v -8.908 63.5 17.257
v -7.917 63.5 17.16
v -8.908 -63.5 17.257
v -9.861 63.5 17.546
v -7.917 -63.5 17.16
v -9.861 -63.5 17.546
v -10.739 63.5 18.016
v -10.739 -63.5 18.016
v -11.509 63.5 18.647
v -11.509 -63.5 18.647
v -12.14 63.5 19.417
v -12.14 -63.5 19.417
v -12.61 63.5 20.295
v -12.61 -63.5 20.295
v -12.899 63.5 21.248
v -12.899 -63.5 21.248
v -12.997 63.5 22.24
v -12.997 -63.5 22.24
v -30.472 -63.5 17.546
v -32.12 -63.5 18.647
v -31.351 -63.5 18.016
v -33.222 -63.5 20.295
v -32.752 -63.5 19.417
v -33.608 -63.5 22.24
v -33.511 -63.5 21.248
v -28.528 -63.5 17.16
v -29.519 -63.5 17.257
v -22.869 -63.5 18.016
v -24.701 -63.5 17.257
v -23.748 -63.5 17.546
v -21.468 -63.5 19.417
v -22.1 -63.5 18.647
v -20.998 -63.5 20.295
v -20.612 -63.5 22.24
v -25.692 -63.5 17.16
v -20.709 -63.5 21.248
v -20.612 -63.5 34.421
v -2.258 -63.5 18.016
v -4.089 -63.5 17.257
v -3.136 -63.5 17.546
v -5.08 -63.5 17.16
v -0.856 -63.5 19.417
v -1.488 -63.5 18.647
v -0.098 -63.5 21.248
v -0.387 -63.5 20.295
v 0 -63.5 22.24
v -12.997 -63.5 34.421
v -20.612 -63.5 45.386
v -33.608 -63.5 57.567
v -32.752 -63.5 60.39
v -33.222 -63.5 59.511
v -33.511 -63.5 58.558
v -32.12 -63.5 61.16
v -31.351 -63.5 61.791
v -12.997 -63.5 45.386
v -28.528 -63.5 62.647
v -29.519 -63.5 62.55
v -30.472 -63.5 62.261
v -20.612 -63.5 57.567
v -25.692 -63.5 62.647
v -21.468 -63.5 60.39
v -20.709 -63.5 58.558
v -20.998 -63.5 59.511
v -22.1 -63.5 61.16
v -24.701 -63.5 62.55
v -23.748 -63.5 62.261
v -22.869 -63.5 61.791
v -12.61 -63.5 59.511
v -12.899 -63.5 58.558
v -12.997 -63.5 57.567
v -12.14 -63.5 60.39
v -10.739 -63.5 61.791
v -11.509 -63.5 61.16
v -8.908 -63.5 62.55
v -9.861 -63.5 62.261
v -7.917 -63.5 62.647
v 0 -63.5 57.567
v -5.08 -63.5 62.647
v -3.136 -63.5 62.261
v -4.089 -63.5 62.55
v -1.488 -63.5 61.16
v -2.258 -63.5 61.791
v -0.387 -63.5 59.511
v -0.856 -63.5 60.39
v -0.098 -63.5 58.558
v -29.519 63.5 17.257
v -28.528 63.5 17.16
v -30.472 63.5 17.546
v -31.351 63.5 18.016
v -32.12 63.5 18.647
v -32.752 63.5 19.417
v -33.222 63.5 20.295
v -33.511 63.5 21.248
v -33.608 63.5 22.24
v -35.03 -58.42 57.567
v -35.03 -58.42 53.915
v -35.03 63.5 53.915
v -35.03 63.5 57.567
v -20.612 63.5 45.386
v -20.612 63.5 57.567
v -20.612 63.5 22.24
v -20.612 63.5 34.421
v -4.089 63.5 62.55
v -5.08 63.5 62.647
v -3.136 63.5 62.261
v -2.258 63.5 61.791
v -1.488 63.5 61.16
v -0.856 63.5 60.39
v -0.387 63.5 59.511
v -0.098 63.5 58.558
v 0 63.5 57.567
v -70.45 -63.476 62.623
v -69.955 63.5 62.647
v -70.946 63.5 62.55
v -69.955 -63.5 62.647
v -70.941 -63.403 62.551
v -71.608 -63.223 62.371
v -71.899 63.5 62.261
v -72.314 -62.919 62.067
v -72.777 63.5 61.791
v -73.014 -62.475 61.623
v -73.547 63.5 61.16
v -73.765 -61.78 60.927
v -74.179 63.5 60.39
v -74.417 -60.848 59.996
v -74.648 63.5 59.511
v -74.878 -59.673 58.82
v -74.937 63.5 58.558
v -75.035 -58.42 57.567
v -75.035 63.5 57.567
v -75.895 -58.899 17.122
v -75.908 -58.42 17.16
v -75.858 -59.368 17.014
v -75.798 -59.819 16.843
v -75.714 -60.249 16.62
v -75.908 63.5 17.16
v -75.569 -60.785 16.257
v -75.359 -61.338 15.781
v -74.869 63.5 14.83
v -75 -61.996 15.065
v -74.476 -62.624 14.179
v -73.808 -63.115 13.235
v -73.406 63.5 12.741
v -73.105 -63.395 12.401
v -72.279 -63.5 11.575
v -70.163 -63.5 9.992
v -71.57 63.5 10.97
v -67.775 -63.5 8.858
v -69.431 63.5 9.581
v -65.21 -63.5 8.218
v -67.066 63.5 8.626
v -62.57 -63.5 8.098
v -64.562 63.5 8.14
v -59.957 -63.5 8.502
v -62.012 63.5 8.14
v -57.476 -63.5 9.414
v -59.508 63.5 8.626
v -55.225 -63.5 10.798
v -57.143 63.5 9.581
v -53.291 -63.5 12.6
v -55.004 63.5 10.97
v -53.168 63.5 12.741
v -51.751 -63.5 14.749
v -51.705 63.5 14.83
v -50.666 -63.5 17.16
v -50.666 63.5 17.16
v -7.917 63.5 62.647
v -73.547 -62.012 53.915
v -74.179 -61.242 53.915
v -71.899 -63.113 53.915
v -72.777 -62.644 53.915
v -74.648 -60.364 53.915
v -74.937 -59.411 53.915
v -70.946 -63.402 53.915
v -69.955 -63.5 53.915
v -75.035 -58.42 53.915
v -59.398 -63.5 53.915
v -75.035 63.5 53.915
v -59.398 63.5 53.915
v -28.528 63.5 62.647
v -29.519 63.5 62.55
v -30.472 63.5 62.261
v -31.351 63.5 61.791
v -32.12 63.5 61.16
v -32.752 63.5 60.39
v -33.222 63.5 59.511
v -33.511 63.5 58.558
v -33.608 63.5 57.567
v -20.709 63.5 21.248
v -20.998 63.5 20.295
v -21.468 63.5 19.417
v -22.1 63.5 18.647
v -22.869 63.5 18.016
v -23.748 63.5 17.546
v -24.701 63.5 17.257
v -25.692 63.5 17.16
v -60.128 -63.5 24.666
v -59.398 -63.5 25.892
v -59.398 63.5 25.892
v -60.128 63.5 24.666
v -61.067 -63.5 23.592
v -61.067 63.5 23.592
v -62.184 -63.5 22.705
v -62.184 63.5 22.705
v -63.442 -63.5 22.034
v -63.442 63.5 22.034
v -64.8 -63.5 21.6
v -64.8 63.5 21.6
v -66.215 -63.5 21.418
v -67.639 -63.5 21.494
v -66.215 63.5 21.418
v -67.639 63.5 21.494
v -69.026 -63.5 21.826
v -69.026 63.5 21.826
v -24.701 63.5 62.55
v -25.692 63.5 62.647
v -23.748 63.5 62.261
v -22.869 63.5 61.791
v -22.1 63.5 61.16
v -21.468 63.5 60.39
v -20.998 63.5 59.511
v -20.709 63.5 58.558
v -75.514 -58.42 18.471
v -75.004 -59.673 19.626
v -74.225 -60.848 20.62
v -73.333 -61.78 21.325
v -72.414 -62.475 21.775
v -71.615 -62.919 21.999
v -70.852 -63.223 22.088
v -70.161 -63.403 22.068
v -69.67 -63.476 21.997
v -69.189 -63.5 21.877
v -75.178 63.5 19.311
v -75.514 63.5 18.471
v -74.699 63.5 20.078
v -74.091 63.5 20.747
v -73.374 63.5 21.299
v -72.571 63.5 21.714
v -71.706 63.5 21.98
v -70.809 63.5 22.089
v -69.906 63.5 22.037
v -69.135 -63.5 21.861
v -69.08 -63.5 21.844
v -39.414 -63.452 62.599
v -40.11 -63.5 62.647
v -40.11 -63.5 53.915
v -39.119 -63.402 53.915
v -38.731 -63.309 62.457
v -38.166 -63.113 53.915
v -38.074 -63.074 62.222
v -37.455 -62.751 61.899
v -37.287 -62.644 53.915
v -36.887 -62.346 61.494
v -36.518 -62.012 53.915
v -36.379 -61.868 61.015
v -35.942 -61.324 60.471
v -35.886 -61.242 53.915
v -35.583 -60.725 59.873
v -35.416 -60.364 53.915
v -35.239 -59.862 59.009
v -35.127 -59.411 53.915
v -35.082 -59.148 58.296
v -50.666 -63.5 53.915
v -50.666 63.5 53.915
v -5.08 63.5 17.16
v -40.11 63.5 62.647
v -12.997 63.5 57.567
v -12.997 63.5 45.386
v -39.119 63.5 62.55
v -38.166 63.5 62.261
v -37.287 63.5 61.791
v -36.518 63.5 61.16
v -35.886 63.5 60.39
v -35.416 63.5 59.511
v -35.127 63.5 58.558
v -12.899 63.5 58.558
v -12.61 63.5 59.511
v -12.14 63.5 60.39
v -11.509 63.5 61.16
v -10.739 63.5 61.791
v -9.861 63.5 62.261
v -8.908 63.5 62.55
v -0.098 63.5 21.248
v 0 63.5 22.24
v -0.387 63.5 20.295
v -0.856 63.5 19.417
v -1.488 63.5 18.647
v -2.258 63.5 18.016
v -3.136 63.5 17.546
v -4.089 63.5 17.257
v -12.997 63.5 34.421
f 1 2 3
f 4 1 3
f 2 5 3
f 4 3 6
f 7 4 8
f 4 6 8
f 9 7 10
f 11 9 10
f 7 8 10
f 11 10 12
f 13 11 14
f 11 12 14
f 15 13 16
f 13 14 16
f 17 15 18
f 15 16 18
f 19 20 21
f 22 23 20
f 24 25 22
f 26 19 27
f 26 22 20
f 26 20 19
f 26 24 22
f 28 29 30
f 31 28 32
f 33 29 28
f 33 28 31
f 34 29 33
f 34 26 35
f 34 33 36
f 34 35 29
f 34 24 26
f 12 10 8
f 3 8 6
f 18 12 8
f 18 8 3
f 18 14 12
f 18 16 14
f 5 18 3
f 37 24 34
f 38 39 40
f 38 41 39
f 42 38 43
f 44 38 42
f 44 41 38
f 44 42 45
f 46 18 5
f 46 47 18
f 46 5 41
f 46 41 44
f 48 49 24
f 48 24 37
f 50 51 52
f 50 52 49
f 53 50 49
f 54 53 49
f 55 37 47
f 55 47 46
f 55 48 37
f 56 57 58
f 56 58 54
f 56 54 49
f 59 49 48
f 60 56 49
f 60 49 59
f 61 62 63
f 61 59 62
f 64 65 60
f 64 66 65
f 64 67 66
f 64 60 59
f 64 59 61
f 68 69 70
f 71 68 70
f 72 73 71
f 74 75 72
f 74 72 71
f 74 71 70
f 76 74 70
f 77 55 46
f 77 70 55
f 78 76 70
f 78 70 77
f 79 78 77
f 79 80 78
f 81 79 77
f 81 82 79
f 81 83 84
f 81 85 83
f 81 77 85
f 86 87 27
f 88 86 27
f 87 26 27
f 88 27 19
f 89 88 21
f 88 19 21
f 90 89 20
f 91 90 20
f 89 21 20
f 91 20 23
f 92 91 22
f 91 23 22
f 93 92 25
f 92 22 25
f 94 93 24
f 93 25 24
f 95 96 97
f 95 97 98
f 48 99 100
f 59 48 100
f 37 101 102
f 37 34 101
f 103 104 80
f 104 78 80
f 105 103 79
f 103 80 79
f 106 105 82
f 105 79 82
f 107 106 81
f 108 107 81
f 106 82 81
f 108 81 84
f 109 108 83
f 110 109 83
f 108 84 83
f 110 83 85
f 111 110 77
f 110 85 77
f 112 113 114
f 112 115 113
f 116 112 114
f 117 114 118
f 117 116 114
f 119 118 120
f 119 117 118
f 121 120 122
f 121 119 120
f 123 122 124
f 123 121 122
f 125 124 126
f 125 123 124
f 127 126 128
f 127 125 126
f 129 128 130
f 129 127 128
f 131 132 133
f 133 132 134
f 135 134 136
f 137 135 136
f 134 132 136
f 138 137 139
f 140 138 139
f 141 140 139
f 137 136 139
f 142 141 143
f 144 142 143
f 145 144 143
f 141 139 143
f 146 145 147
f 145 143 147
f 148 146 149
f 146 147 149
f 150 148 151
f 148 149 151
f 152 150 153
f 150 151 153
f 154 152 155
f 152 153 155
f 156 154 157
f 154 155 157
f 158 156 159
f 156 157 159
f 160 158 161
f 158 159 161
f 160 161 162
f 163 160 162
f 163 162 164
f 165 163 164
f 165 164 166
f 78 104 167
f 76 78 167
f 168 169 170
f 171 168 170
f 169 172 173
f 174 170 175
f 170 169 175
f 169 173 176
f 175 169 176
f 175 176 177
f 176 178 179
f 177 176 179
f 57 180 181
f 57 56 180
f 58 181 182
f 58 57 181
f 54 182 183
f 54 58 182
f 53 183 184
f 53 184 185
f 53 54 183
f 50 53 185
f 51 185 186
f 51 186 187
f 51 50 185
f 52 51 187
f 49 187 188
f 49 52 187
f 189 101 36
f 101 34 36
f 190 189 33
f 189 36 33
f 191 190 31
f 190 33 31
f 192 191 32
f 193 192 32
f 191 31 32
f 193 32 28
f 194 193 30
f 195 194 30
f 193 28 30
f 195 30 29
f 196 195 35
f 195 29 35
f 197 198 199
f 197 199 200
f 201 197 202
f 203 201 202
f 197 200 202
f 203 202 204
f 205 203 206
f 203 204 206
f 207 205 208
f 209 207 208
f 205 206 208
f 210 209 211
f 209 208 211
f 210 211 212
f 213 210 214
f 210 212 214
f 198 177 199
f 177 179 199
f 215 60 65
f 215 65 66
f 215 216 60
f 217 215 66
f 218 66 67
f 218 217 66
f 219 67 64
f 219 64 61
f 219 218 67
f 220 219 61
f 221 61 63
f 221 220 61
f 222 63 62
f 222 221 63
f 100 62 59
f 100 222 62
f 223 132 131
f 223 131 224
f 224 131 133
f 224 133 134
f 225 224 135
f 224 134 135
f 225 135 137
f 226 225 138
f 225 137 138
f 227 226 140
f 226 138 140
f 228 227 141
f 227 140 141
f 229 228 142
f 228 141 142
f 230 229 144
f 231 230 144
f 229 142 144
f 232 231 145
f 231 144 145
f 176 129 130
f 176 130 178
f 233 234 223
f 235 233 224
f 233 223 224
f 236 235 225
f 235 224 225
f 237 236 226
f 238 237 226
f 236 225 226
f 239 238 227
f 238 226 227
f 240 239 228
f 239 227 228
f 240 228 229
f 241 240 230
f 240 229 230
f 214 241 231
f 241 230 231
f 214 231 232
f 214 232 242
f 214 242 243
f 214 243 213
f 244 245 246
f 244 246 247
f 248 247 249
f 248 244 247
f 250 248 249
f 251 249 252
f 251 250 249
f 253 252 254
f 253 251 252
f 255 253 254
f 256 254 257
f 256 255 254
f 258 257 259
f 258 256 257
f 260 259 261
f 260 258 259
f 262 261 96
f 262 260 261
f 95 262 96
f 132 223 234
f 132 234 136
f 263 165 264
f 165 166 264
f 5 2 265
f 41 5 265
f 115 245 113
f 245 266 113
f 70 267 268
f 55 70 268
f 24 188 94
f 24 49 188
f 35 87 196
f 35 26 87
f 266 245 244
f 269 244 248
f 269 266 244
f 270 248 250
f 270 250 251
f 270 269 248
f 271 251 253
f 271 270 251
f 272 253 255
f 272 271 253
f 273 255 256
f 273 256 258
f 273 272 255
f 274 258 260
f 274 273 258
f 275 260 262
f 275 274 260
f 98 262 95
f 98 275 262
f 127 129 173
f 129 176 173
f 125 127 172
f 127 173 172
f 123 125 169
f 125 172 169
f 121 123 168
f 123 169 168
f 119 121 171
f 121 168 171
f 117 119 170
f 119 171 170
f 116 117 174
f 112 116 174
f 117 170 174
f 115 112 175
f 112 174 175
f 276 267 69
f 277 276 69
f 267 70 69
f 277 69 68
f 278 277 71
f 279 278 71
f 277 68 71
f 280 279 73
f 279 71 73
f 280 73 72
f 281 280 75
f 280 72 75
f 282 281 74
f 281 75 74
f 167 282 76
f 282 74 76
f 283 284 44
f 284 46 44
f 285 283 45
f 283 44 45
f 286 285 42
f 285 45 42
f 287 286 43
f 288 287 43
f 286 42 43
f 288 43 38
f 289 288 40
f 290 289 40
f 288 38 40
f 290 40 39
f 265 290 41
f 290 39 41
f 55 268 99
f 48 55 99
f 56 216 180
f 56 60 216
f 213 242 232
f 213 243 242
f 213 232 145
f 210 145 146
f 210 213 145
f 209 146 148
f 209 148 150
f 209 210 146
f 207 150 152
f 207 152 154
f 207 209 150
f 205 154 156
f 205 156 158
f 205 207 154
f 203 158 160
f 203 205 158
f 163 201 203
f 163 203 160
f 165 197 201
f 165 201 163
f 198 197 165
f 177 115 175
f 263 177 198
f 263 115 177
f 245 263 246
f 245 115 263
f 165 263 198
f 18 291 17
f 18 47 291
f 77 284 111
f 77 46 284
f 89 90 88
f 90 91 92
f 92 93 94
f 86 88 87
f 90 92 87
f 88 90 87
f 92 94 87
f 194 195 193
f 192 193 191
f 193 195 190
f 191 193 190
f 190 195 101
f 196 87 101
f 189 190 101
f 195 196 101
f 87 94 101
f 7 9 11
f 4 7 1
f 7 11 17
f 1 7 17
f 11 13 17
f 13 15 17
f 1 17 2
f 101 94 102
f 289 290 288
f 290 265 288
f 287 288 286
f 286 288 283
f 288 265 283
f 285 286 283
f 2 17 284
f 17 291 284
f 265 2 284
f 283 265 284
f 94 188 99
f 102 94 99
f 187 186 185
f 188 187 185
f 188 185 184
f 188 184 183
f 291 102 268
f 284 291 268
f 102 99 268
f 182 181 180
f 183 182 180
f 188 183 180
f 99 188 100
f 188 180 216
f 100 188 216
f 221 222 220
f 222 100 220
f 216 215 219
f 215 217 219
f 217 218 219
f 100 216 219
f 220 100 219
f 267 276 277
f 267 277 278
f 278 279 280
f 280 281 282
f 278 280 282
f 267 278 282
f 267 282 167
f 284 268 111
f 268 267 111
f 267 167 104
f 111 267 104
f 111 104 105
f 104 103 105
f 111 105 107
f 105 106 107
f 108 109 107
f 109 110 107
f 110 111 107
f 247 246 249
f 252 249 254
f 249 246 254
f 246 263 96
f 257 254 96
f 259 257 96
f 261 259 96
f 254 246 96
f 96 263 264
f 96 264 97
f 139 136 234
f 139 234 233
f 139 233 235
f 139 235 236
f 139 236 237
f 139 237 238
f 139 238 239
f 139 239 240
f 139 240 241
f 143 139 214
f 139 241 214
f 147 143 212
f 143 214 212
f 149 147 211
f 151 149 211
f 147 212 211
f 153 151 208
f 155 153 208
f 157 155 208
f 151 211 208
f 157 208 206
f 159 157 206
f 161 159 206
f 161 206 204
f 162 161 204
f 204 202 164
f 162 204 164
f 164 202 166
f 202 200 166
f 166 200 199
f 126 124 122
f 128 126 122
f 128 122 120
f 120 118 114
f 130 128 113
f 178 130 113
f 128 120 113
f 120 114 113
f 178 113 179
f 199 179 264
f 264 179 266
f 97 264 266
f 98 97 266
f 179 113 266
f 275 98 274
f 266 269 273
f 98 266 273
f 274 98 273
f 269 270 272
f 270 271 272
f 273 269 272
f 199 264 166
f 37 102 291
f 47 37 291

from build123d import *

# Parameters (mm, degrees)
F1_DEPTH = 63.5
F2_R     = 5.08


with BuildPart() as f1:
    # F0 (on Front) → F1 (new body, symmetric)
    with BuildSketch(Plane.XZ):
        with BuildLine():
            Line((-35.029758, 62.647425), (-75.03476, 62.647425))
            Line((-75.03476, 62.647425), (-75.03476, 53.91537))
            Line((-75.03476, 53.91537), (-59.398286, 53.91537))
            Line((-59.398286, 53.91537), (-59.398286, 25.891561))
            ThreePointArc((-59.398286, 25.891561), (-66.280406, 21.416262), (-73.410191, 25.485419))
            Line((-73.410191, 25.485419), (-75.907962, 17.159505))
            ThreePointArc((-75.907962, 17.159505), (-63.287097, 8.078677), (-50.666232, 17.159505))
            Line((-50.666232, 17.159505), (-50.666232, 53.91537))
            Line((-50.666232, 53.91537), (-35.029758, 53.91537))
            Line((-35.029758, 53.91537), (-35.029758, 62.647425))
        make_face()
        Polygon((-20.611713, 62.647425), (-33.608261, 62.647425), (-33.608261, 17.159505), (-20.611713, 17.159505), (-20.611713, 34.420546), (-12.996549, 34.420546), (-12.996549, 17.159505), (0, 17.159505), (0, 62.647425), (-12.996549, 62.647425), (-12.996549, 45.386383), (-20.611713, 45.386383), align=None)
    extrude(amount=F1_DEPTH, both=True)

    # F2
    f2_edges = [f1.edges().sort_by_distance(p)[0] for p in [
        (-74.659076, -63.5, 21.322462),
        (-75.03476, -63.5, 58.281397),
        (-75.03476, 0, 62.647425),
        (-35.029758, 0, 62.647425),
        (-35.029758, -63.5, 58.281397),
        (-73.410191, 0, 25.485419),
        (0, 0, 62.647425),
        (-12.996549, 0, 62.647425),
        (-20.611713, 0, 62.647425),
        (-33.608261, 0, 62.647425),
        (0, 0, 17.159505),
        (-20.611713, 0, 17.159505),
        (-33.608261, 0, 17.159505),
        (-12.996549, 0, 17.159505),
    ]]
    fillet(f2_edges, radius=F2_R)


solid = f1.part
